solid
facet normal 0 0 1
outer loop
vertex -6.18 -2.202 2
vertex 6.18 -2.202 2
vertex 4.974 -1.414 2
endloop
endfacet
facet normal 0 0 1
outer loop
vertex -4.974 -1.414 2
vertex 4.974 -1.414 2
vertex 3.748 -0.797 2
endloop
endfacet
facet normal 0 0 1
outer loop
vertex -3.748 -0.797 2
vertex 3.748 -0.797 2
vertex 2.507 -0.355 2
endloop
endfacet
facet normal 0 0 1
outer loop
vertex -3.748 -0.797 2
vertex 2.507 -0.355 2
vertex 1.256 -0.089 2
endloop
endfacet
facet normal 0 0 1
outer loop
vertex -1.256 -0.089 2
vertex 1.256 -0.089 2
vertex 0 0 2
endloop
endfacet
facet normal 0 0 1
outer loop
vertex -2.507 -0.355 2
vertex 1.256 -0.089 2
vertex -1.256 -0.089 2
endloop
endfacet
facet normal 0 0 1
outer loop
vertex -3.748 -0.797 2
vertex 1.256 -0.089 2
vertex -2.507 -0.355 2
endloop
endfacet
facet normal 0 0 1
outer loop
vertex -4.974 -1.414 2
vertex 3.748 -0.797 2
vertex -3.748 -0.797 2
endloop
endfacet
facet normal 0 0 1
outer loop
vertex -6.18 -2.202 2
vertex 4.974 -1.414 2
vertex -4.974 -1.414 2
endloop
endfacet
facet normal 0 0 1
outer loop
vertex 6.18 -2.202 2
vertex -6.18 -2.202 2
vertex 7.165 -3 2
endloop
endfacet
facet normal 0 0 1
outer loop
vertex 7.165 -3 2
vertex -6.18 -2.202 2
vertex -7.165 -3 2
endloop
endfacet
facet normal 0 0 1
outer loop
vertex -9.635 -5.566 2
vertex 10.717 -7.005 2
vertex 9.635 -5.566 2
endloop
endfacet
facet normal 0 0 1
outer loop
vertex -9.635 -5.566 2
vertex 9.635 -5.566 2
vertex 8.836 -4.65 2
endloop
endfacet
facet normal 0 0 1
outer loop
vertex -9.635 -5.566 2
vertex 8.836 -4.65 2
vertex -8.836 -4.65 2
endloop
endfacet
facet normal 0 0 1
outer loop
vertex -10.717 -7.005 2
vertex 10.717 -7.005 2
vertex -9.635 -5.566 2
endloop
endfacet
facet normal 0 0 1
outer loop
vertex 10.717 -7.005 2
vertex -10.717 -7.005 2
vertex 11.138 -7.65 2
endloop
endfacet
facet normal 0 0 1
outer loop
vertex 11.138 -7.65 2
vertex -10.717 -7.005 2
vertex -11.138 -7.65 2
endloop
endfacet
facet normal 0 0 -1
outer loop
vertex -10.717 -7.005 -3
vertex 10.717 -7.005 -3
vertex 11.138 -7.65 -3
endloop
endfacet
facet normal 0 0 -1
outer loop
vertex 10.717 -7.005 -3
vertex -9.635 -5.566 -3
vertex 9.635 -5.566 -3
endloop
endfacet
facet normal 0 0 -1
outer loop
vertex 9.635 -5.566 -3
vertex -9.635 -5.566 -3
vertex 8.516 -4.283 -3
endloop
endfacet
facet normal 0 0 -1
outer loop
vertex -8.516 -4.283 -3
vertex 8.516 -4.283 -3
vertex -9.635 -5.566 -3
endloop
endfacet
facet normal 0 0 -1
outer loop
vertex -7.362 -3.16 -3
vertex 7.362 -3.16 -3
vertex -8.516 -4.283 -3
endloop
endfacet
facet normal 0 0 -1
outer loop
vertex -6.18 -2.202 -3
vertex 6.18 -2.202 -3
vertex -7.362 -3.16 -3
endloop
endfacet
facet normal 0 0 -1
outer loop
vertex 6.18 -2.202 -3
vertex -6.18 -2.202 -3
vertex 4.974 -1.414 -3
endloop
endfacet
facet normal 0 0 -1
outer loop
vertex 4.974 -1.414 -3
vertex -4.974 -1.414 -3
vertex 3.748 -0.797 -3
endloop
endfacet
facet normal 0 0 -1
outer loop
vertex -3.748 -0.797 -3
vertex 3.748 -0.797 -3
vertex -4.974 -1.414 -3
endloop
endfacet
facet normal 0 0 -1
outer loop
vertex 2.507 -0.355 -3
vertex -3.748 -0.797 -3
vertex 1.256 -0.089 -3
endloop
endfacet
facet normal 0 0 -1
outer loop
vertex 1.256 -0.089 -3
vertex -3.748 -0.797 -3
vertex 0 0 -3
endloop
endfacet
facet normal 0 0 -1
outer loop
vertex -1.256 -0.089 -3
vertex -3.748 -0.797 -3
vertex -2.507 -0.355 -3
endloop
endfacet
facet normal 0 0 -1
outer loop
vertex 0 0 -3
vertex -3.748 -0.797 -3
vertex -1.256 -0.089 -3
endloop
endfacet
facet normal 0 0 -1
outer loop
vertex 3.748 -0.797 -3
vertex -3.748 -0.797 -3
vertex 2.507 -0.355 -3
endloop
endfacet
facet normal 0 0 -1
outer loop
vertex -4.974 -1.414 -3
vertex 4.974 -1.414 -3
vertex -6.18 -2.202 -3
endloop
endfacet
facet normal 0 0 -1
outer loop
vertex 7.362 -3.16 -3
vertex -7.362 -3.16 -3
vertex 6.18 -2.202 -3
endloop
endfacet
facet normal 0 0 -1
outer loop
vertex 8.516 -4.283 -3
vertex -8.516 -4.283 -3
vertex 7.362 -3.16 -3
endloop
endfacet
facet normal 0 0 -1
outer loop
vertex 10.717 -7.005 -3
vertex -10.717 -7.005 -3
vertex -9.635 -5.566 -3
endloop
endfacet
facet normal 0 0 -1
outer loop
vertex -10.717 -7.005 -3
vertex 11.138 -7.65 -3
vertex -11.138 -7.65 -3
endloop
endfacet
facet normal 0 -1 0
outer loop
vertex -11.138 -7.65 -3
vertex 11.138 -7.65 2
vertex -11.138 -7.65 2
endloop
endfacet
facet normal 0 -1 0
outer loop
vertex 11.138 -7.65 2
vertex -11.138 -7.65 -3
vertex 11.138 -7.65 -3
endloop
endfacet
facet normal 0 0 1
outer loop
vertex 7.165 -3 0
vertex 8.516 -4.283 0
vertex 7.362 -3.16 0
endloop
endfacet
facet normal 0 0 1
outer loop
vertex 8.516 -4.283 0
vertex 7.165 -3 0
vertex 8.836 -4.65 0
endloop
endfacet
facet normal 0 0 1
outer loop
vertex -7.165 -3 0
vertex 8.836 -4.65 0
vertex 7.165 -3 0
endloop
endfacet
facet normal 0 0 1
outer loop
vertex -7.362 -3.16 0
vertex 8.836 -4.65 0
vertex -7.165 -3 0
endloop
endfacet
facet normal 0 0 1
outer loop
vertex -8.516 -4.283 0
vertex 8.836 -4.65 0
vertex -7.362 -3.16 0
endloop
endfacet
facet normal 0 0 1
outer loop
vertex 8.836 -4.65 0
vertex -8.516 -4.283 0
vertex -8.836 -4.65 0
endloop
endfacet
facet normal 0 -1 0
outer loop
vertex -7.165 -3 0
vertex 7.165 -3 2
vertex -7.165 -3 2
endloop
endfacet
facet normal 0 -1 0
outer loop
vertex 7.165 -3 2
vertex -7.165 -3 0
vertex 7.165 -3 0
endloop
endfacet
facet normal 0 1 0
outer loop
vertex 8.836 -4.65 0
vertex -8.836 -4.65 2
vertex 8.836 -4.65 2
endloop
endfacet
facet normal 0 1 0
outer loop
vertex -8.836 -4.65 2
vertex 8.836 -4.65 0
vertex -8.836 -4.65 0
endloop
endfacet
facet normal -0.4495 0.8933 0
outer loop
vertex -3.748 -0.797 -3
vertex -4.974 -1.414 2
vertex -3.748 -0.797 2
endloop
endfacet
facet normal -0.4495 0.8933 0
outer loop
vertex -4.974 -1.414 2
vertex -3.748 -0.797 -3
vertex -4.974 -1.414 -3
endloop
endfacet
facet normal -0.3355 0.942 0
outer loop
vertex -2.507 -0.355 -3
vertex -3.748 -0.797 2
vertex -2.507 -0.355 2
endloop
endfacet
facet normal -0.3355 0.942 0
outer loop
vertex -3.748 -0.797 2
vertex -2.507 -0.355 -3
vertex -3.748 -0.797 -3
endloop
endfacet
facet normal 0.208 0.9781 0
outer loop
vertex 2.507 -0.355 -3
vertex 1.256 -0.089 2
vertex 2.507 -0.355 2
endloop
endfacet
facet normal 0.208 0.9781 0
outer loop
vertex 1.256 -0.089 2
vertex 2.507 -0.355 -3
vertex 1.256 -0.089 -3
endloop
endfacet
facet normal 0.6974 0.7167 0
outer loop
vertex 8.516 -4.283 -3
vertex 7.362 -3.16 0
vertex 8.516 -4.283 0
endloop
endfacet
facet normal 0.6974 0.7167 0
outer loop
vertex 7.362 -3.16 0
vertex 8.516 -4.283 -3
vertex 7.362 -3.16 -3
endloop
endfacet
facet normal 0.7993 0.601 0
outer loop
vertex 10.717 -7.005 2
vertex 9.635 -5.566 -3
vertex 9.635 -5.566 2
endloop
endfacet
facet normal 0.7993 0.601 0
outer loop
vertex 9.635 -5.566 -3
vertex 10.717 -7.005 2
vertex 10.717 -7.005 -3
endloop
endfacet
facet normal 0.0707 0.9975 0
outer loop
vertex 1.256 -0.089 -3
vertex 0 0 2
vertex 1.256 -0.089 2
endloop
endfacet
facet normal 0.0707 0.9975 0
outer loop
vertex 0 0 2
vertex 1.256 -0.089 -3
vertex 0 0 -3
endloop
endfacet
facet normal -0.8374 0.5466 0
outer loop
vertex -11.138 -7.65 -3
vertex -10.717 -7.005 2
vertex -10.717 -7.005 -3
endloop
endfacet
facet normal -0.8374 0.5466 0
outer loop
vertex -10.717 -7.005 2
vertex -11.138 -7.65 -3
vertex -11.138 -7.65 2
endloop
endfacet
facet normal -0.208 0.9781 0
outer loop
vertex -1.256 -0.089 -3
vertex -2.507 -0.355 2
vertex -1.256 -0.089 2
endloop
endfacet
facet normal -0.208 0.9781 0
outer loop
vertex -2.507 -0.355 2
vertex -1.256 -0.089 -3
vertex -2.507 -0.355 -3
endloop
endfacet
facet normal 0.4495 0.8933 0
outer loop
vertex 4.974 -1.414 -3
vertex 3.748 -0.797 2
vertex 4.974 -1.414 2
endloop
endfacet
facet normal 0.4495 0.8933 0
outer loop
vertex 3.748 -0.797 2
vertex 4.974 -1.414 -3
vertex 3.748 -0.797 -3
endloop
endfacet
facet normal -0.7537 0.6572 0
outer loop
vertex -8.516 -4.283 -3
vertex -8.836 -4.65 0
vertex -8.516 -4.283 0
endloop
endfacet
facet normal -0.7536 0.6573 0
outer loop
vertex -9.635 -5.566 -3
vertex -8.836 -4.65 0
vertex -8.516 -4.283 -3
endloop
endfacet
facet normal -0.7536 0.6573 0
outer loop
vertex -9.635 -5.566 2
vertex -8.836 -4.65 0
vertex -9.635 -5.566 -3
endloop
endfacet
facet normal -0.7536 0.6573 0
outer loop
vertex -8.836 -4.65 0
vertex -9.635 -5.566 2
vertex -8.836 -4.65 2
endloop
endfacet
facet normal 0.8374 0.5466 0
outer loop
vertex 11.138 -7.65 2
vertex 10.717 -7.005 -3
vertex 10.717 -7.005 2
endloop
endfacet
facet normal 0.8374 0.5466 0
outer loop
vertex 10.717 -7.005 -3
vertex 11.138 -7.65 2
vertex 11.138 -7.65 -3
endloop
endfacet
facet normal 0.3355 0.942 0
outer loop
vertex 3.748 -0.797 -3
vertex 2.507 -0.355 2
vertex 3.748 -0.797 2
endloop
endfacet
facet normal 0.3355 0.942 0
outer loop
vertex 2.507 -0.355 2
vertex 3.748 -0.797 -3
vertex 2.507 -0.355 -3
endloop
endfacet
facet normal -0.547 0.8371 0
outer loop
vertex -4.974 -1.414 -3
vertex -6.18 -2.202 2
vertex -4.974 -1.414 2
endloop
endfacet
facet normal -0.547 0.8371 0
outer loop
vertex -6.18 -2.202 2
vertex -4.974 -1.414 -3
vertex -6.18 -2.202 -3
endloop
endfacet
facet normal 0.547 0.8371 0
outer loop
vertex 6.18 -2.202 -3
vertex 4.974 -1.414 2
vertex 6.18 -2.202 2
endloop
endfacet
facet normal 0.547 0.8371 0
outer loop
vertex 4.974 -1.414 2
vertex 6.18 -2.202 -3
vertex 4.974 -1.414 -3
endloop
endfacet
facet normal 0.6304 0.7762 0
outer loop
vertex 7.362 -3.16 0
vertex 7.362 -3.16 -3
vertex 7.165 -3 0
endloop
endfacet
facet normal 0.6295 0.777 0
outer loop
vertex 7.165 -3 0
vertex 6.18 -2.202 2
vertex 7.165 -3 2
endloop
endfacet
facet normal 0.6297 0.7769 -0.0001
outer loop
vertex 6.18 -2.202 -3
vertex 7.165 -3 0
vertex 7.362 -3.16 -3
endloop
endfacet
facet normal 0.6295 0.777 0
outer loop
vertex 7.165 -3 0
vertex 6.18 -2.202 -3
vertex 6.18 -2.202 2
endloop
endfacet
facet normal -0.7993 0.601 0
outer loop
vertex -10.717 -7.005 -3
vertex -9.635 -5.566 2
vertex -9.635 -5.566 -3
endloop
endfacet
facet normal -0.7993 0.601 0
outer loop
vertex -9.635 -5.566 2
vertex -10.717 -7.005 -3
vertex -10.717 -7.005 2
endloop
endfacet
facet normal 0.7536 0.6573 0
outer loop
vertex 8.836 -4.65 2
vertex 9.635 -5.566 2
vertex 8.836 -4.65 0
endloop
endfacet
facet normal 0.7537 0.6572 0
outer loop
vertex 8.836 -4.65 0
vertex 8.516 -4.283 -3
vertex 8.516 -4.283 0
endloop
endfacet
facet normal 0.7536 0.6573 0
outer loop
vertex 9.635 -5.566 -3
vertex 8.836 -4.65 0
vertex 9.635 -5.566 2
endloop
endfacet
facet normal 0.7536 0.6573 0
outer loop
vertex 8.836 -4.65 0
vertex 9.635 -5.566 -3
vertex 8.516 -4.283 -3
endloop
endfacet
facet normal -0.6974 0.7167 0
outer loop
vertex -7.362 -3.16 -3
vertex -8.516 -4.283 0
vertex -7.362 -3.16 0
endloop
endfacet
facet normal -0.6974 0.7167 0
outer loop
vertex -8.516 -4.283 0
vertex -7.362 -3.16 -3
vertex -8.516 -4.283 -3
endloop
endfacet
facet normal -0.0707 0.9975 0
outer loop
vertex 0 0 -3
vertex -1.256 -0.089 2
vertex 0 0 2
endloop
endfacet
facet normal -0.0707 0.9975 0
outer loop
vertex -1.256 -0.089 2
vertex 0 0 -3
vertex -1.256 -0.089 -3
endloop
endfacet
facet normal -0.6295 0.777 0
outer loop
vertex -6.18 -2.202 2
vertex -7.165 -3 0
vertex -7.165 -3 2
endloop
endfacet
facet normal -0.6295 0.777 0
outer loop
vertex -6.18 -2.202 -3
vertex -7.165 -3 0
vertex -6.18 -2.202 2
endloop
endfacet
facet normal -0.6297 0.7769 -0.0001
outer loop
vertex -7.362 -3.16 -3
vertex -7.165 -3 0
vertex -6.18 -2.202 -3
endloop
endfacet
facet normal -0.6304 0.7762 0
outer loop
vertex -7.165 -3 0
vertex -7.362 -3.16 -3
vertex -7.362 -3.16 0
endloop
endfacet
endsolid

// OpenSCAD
largeur_fente=4;
longueur_fente=26.1;
epaisseur_fente=3;
epaisseur_plaque=2;

module support_fente() {
translate([0,0,-epaisseur_fente/2])
    cube([largeur_fente, longueur_fente,epaisseur_fente],
        center=true);

translate([0,0,epaisseur_plaque/2])
    cube([largeur_fente*2, longueur_fente,epaisseur_plaque],
        center=true);
}

module support_ovale() {
    intersection() {
    translate([0,-90/2,-epaisseur_fente])
        scale (v=[4,9,1]) 
        cylinder(h = epaisseur_fente+epaisseur_plaque,
            d=10, $fn=100);
    difference() {
        longueur=3+1.65+3;
        translate([-12,(-2*longueur)/2,-epaisseur_fente])
            cube([24,longueur,epaisseur_fente+epaisseur_plaque]);
        translate([-12,-1.65-3,0])
            #cube([24,1.65,epaisseur_plaque]);
        
    }
    }
}

support_ovale();
